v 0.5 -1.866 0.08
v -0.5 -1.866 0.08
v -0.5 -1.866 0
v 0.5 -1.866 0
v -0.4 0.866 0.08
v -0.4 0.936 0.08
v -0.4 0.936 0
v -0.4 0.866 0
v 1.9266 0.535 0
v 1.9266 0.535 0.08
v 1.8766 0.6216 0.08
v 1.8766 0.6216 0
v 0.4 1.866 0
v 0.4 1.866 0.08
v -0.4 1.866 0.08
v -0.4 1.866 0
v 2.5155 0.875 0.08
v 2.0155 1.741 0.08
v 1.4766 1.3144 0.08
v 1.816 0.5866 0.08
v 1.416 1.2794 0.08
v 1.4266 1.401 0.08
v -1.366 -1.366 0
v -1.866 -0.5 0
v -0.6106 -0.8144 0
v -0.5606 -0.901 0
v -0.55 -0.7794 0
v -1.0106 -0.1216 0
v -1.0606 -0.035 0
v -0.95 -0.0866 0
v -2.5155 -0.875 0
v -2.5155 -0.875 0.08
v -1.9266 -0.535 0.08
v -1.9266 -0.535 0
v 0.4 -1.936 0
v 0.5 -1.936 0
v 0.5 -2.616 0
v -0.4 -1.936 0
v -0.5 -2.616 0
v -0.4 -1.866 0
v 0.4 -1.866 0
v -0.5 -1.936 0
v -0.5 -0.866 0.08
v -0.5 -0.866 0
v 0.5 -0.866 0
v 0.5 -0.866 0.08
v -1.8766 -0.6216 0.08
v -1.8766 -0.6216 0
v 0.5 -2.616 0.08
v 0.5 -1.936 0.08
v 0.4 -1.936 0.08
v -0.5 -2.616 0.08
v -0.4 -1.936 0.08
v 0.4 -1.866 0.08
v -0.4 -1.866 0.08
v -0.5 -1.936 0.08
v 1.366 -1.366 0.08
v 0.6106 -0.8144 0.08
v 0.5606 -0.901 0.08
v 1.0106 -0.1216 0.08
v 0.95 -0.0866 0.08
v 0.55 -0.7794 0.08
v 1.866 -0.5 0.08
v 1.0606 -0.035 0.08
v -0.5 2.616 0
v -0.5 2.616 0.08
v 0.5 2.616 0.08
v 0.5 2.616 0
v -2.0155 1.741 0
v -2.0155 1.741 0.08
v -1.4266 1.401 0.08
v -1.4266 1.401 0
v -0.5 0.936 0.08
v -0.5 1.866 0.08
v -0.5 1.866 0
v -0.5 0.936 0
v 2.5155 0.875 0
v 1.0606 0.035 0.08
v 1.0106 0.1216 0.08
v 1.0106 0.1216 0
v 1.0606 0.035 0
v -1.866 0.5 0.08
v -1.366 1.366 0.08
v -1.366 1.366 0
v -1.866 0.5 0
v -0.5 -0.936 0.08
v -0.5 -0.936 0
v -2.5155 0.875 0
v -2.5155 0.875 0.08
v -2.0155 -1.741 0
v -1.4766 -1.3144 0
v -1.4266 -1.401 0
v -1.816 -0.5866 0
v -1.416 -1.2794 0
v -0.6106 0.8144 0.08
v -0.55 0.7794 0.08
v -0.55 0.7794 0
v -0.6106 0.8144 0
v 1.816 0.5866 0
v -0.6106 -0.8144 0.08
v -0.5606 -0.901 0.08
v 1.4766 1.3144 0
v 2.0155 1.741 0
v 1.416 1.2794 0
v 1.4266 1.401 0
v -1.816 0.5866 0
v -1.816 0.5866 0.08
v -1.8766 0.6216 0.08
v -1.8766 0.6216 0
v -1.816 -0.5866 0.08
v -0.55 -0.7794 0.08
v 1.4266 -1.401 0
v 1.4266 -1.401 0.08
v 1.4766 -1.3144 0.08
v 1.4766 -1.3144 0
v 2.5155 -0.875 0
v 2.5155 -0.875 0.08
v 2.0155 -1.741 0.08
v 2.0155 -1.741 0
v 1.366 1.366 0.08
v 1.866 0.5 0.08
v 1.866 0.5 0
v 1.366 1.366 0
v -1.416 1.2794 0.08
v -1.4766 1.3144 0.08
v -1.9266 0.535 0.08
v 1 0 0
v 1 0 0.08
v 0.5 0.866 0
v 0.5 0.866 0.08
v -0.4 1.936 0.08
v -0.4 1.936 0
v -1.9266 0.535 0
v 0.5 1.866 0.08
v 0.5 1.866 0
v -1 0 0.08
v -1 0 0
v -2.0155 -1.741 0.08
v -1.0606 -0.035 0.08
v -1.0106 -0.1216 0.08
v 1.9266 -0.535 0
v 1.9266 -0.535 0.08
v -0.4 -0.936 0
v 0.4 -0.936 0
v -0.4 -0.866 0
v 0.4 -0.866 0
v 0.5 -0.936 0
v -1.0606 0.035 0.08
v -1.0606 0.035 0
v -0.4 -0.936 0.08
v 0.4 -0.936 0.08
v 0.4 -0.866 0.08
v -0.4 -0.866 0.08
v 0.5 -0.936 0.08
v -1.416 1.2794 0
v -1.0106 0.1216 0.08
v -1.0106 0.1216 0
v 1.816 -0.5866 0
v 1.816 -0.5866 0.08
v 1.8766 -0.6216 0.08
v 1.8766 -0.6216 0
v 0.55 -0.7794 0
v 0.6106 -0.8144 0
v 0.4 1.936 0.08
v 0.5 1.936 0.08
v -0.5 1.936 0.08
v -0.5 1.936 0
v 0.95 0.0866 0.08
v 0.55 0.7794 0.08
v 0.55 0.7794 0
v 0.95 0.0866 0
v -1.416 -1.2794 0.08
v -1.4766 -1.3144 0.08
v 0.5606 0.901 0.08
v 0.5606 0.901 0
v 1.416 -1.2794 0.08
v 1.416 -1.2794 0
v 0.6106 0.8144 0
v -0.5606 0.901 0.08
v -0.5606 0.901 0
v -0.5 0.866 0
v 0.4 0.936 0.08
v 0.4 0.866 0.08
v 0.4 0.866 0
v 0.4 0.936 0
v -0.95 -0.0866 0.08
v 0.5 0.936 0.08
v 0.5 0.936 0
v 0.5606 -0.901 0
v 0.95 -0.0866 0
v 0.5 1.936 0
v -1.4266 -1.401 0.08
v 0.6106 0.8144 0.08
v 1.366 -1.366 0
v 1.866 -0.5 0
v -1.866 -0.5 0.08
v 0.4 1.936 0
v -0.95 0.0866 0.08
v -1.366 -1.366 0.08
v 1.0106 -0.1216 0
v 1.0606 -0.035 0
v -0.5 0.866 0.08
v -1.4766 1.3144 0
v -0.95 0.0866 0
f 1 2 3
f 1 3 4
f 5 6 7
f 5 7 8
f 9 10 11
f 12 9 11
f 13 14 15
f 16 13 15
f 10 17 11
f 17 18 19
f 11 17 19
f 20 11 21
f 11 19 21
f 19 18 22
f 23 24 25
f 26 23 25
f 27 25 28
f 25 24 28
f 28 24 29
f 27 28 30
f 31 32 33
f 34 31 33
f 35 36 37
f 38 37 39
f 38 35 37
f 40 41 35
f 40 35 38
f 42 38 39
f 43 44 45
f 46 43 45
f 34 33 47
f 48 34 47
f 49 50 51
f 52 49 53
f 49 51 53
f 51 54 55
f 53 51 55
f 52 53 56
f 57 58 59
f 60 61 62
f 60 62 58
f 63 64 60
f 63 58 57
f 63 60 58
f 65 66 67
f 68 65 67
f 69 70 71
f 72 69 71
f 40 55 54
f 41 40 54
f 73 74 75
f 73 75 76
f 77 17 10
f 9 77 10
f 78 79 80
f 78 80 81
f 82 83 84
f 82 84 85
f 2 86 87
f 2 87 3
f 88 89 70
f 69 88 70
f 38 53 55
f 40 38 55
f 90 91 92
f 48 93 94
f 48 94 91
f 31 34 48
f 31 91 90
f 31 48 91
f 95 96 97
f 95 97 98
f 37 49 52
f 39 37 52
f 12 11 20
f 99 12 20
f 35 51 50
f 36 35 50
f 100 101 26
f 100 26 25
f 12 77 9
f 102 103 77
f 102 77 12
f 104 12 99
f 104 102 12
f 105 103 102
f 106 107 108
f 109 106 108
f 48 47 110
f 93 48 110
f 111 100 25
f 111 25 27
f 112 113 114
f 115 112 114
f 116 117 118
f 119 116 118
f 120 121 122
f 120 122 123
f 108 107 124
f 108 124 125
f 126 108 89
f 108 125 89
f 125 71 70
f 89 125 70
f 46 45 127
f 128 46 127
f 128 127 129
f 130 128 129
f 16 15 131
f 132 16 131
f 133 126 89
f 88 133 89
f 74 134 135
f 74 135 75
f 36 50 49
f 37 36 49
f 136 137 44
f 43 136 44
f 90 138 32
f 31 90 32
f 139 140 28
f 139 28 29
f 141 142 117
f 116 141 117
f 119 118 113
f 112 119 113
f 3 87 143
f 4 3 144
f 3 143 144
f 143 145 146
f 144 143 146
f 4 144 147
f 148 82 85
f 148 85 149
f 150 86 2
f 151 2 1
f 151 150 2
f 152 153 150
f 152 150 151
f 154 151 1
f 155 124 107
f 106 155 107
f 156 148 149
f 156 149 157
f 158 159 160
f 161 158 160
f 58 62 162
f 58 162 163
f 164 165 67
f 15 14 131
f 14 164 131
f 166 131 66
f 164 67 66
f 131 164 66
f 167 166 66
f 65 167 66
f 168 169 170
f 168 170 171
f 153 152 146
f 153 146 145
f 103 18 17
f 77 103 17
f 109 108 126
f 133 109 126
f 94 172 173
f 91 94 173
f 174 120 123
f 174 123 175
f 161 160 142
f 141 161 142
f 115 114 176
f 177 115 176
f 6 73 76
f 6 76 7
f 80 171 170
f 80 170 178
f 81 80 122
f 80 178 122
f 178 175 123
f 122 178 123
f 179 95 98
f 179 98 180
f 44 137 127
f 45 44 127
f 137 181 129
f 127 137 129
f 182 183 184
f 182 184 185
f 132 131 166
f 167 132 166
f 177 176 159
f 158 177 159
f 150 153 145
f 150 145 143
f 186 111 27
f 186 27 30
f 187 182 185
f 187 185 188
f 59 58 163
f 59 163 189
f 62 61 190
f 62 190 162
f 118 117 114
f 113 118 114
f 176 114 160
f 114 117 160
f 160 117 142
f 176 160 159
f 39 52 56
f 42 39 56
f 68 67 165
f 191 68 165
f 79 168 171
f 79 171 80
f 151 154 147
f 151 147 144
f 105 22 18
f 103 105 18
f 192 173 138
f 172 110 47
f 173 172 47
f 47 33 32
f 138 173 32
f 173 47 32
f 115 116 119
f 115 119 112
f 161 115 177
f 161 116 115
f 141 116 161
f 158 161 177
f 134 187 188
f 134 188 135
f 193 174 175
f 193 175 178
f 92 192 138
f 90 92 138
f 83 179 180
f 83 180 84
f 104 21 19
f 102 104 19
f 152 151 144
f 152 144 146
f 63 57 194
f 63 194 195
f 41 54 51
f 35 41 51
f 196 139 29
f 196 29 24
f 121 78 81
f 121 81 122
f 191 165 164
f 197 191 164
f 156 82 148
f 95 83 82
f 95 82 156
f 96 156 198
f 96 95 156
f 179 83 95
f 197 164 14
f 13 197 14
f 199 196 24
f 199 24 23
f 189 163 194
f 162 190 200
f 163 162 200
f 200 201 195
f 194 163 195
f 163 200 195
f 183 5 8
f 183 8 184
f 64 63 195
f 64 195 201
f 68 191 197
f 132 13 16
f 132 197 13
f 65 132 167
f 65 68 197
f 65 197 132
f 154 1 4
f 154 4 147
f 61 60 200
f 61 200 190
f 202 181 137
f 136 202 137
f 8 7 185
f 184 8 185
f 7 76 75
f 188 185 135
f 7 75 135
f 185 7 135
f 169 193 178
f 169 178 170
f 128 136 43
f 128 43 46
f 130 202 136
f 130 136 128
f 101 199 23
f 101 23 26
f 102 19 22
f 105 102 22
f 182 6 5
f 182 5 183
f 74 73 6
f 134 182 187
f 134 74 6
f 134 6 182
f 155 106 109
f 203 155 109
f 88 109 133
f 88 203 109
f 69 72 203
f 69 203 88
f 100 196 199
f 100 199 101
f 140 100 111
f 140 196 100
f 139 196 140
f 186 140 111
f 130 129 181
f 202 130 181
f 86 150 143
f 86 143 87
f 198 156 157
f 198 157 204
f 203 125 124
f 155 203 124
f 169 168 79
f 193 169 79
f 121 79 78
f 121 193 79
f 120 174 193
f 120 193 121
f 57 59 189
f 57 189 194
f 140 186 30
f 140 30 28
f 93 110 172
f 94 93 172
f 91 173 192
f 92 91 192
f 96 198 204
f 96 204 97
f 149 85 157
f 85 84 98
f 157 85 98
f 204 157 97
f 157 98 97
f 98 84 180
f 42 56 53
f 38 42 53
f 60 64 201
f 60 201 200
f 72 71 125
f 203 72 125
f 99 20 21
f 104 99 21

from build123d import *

# Parameters (mm, degrees)
BOSS_EXTRUDE1_DEPTH   = 0.08
BOSS_EXTRUDE3_DEPTH   = 0.08
BOSS_EXTRUDE3_2_DEPTH = 0.08
BOSS_EXTRUDE3_3_DEPTH = 0.08
BOSS_EXTRUDE3_4_DEPTH = 0.08
BOSS_EXTRUDE3_5_DEPTH = 0.08
BOSS_EXTRUDE3_6_DEPTH = 0.08
BOSS_EXTRUDE4_DEPTH   = 0.08
BOSS_EXTRUDE4_2_DEPTH = 0.08
BOSS_EXTRUDE4_3_DEPTH = 0.08
BOSS_EXTRUDE4_4_DEPTH = 0.08
BOSS_EXTRUDE4_5_DEPTH = 0.08
BOSS_EXTRUDE4_6_DEPTH = 0.08


with BuildPart() as part:
    # Sketch1 → Boss-Extrude1 (new body)
    with BuildSketch(Plane.XY):
        Polygon((-1, 0), (-0.5, -0.866025404), (0.5, -0.866025404), (1, 0), (0.5, 0.866025404), (-0.5, 0.866025404), align=None)
    extrude(amount=BOSS_EXTRUDE1_DEPTH)


with BuildPart() as body_2:
    # Sketch2 → Boss-Extrude3 (new body)
    with BuildSketch(Plane.XY.offset(0.08)):
        Polygon((-1.010621778, 0.12160254), (-0.95, 0.08660254), (-0.55, 0.779422863), (-0.610621778, 0.814422863), (-0.560621778, 0.901025404), (-1.366025404, 1.366025404), (-1.866025404, 0.5), (-1.060621778, 0.035), align=None)
    extrude(amount=-BOSS_EXTRUDE3_DEPTH)


with BuildPart() as body_3:
    # Sketch2 → Boss-Extrude3 2 (new body)
    with BuildSketch(Plane.XY.offset(0.08)):
        Polygon((-0.4, 0.936025404), (-0.4, 0.866025404), (0.4, 0.866025404), (0.4, 0.936025404), (0.5, 0.936025404), (0.5, 1.866025404), (-0.5, 1.866025404), (-0.5, 0.936025404), align=None)
    extrude(amount=-BOSS_EXTRUDE3_2_DEPTH)


with BuildPart() as body_4:
    # Sketch2 → Boss-Extrude3 3 (new body)
    with BuildSketch(Plane.XY.offset(0.08)):
        Polygon((0.610621778, 0.814422863), (0.55, 0.779422863), (0.95, 0.08660254), (1.010621778, 0.12160254), (1.060621778, 0.035), (1.866025404, 0.5), (1.366025404, 1.366025404), (0.560621778, 0.901025404), align=None)
    extrude(amount=-BOSS_EXTRUDE3_3_DEPTH)


with BuildPart() as body_5:
    # Sketch2 → Boss-Extrude3 4 (new body)
    with BuildSketch(Plane.XY.offset(0.08)):
        Polygon((1.010621778, -0.12160254), (0.95, -0.08660254), (0.55, -0.779422863), (0.610621778, -0.814422863), (0.560621778, -0.901025404), (1.366025404, -1.366025404), (1.866025404, -0.5), (1.060621778, -0.035), align=None)
    extrude(amount=-BOSS_EXTRUDE3_4_DEPTH)


with BuildPart() as body_6:
    # Sketch2 → Boss-Extrude3 5 (new body)
    with BuildSketch(Plane.XY.offset(0.08)):
        Polygon((0.4, -0.936025404), (0.4, -0.866025404), (-0.4, -0.866025404), (-0.4, -0.936025404), (-0.5, -0.936025404), (-0.5, -1.866025404), (0.5, -1.866025404), (0.5, -0.936025404), align=None)
    extrude(amount=-BOSS_EXTRUDE3_5_DEPTH)


with BuildPart() as body_7:
    # Sketch2 → Boss-Extrude3 6 (new body)
    with BuildSketch(Plane.XY.offset(0.08)):
        Polygon((-0.610621778, -0.814422863), (-0.55, -0.779422863), (-0.95, -0.08660254), (-1.010621778, -0.12160254), (-1.060621778, -0.035), (-1.866025404, -0.5), (-1.366025404, -1.366025404), (-0.560621778, -0.901025404), align=None)
    extrude(amount=-BOSS_EXTRUDE3_6_DEPTH)


with BuildPart() as body_8:
    # Sketch3 → Boss-Extrude4 (new body)
    with BuildSketch(Plane.XY.offset(0.08)):
        Polygon((-1.416025404, 1.279422863), (-1.816025404, 0.58660254), (-1.876647182, 0.62160254), (-1.926647182, 0.535), (-2.515544457, 0.875), (-2.015544457, 1.741025404), (-1.426647182, 1.401025404), (-1.476647182, 1.314422863), align=None)
    extrude(amount=-BOSS_EXTRUDE4_DEPTH)


with BuildPart() as body_9:
    # Sketch3 → Boss-Extrude4 2 (new body)
    with BuildSketch(Plane.XY.offset(0.08)):
        Polygon((0.4, 1.866025404), (-0.4, 1.866025404), (-0.4, 1.936025404), (-0.5, 1.936025404), (-0.5, 2.616025404), (0.5, 2.616025404), (0.5, 1.936025404), (0.4, 1.936025404), align=None)
    extrude(amount=-BOSS_EXTRUDE4_2_DEPTH)


with BuildPart() as body_10:
    # Sketch3 → Boss-Extrude4 3 (new body)
    with BuildSketch(Plane.XY.offset(0.08)):
        Polygon((1.816025404, 0.58660254), (1.416025404, 1.279422863), (1.476647182, 1.314422863), (1.426647182, 1.401025404), (2.015544457, 1.741025404), (2.515544457, 0.875), (1.926647182, 0.535), (1.876647182, 0.62160254), align=None)
    extrude(amount=-BOSS_EXTRUDE4_3_DEPTH)


with BuildPart() as body_11:
    # Sketch3 → Boss-Extrude4 4 (new body)
    with BuildSketch(Plane.XY.offset(0.08)):
        Polygon((1.416025404, -1.279422863), (1.816025404, -0.58660254), (1.876647182, -0.62160254), (1.926647182, -0.535), (2.515544457, -0.875), (2.015544457, -1.741025404), (1.426647182, -1.401025404), (1.476647182, -1.314422863), align=None)
    extrude(amount=-BOSS_EXTRUDE4_4_DEPTH)


with BuildPart() as body_12:
    # Sketch3 → Boss-Extrude4 5 (new body)
    with BuildSketch(Plane.XY.offset(0.08)):
        Polygon((-0.4, -1.866025404), (0.4, -1.866025404), (0.4, -1.936025404), (0.5, -1.936025404), (0.5, -2.616025404), (-0.5, -2.616025404), (-0.5, -1.936025404), (-0.4, -1.936025404), align=None)
    extrude(amount=-BOSS_EXTRUDE4_5_DEPTH)


with BuildPart() as body_13:
    # Sketch3 → Boss-Extrude4 6 (new body)
    with BuildSketch(Plane.XY.offset(0.08)):
        Polygon((-1.816025404, -0.58660254), (-1.416025404, -1.279422863), (-1.476647182, -1.314422863), (-1.426647182, -1.401025404), (-2.015544457, -1.741025404), (-2.515544457, -0.875), (-1.926647182, -0.535), (-1.876647182, -0.62160254), align=None)
    extrude(amount=-BOSS_EXTRUDE4_6_DEPTH)


solid = Compound([part.part, body_2.part, body_3.part, body_4.part, body_5.part, body_6.part, body_7.part, body_8.part, body_9.part, body_10.part, body_11.part, body_12.part, body_13.part])
